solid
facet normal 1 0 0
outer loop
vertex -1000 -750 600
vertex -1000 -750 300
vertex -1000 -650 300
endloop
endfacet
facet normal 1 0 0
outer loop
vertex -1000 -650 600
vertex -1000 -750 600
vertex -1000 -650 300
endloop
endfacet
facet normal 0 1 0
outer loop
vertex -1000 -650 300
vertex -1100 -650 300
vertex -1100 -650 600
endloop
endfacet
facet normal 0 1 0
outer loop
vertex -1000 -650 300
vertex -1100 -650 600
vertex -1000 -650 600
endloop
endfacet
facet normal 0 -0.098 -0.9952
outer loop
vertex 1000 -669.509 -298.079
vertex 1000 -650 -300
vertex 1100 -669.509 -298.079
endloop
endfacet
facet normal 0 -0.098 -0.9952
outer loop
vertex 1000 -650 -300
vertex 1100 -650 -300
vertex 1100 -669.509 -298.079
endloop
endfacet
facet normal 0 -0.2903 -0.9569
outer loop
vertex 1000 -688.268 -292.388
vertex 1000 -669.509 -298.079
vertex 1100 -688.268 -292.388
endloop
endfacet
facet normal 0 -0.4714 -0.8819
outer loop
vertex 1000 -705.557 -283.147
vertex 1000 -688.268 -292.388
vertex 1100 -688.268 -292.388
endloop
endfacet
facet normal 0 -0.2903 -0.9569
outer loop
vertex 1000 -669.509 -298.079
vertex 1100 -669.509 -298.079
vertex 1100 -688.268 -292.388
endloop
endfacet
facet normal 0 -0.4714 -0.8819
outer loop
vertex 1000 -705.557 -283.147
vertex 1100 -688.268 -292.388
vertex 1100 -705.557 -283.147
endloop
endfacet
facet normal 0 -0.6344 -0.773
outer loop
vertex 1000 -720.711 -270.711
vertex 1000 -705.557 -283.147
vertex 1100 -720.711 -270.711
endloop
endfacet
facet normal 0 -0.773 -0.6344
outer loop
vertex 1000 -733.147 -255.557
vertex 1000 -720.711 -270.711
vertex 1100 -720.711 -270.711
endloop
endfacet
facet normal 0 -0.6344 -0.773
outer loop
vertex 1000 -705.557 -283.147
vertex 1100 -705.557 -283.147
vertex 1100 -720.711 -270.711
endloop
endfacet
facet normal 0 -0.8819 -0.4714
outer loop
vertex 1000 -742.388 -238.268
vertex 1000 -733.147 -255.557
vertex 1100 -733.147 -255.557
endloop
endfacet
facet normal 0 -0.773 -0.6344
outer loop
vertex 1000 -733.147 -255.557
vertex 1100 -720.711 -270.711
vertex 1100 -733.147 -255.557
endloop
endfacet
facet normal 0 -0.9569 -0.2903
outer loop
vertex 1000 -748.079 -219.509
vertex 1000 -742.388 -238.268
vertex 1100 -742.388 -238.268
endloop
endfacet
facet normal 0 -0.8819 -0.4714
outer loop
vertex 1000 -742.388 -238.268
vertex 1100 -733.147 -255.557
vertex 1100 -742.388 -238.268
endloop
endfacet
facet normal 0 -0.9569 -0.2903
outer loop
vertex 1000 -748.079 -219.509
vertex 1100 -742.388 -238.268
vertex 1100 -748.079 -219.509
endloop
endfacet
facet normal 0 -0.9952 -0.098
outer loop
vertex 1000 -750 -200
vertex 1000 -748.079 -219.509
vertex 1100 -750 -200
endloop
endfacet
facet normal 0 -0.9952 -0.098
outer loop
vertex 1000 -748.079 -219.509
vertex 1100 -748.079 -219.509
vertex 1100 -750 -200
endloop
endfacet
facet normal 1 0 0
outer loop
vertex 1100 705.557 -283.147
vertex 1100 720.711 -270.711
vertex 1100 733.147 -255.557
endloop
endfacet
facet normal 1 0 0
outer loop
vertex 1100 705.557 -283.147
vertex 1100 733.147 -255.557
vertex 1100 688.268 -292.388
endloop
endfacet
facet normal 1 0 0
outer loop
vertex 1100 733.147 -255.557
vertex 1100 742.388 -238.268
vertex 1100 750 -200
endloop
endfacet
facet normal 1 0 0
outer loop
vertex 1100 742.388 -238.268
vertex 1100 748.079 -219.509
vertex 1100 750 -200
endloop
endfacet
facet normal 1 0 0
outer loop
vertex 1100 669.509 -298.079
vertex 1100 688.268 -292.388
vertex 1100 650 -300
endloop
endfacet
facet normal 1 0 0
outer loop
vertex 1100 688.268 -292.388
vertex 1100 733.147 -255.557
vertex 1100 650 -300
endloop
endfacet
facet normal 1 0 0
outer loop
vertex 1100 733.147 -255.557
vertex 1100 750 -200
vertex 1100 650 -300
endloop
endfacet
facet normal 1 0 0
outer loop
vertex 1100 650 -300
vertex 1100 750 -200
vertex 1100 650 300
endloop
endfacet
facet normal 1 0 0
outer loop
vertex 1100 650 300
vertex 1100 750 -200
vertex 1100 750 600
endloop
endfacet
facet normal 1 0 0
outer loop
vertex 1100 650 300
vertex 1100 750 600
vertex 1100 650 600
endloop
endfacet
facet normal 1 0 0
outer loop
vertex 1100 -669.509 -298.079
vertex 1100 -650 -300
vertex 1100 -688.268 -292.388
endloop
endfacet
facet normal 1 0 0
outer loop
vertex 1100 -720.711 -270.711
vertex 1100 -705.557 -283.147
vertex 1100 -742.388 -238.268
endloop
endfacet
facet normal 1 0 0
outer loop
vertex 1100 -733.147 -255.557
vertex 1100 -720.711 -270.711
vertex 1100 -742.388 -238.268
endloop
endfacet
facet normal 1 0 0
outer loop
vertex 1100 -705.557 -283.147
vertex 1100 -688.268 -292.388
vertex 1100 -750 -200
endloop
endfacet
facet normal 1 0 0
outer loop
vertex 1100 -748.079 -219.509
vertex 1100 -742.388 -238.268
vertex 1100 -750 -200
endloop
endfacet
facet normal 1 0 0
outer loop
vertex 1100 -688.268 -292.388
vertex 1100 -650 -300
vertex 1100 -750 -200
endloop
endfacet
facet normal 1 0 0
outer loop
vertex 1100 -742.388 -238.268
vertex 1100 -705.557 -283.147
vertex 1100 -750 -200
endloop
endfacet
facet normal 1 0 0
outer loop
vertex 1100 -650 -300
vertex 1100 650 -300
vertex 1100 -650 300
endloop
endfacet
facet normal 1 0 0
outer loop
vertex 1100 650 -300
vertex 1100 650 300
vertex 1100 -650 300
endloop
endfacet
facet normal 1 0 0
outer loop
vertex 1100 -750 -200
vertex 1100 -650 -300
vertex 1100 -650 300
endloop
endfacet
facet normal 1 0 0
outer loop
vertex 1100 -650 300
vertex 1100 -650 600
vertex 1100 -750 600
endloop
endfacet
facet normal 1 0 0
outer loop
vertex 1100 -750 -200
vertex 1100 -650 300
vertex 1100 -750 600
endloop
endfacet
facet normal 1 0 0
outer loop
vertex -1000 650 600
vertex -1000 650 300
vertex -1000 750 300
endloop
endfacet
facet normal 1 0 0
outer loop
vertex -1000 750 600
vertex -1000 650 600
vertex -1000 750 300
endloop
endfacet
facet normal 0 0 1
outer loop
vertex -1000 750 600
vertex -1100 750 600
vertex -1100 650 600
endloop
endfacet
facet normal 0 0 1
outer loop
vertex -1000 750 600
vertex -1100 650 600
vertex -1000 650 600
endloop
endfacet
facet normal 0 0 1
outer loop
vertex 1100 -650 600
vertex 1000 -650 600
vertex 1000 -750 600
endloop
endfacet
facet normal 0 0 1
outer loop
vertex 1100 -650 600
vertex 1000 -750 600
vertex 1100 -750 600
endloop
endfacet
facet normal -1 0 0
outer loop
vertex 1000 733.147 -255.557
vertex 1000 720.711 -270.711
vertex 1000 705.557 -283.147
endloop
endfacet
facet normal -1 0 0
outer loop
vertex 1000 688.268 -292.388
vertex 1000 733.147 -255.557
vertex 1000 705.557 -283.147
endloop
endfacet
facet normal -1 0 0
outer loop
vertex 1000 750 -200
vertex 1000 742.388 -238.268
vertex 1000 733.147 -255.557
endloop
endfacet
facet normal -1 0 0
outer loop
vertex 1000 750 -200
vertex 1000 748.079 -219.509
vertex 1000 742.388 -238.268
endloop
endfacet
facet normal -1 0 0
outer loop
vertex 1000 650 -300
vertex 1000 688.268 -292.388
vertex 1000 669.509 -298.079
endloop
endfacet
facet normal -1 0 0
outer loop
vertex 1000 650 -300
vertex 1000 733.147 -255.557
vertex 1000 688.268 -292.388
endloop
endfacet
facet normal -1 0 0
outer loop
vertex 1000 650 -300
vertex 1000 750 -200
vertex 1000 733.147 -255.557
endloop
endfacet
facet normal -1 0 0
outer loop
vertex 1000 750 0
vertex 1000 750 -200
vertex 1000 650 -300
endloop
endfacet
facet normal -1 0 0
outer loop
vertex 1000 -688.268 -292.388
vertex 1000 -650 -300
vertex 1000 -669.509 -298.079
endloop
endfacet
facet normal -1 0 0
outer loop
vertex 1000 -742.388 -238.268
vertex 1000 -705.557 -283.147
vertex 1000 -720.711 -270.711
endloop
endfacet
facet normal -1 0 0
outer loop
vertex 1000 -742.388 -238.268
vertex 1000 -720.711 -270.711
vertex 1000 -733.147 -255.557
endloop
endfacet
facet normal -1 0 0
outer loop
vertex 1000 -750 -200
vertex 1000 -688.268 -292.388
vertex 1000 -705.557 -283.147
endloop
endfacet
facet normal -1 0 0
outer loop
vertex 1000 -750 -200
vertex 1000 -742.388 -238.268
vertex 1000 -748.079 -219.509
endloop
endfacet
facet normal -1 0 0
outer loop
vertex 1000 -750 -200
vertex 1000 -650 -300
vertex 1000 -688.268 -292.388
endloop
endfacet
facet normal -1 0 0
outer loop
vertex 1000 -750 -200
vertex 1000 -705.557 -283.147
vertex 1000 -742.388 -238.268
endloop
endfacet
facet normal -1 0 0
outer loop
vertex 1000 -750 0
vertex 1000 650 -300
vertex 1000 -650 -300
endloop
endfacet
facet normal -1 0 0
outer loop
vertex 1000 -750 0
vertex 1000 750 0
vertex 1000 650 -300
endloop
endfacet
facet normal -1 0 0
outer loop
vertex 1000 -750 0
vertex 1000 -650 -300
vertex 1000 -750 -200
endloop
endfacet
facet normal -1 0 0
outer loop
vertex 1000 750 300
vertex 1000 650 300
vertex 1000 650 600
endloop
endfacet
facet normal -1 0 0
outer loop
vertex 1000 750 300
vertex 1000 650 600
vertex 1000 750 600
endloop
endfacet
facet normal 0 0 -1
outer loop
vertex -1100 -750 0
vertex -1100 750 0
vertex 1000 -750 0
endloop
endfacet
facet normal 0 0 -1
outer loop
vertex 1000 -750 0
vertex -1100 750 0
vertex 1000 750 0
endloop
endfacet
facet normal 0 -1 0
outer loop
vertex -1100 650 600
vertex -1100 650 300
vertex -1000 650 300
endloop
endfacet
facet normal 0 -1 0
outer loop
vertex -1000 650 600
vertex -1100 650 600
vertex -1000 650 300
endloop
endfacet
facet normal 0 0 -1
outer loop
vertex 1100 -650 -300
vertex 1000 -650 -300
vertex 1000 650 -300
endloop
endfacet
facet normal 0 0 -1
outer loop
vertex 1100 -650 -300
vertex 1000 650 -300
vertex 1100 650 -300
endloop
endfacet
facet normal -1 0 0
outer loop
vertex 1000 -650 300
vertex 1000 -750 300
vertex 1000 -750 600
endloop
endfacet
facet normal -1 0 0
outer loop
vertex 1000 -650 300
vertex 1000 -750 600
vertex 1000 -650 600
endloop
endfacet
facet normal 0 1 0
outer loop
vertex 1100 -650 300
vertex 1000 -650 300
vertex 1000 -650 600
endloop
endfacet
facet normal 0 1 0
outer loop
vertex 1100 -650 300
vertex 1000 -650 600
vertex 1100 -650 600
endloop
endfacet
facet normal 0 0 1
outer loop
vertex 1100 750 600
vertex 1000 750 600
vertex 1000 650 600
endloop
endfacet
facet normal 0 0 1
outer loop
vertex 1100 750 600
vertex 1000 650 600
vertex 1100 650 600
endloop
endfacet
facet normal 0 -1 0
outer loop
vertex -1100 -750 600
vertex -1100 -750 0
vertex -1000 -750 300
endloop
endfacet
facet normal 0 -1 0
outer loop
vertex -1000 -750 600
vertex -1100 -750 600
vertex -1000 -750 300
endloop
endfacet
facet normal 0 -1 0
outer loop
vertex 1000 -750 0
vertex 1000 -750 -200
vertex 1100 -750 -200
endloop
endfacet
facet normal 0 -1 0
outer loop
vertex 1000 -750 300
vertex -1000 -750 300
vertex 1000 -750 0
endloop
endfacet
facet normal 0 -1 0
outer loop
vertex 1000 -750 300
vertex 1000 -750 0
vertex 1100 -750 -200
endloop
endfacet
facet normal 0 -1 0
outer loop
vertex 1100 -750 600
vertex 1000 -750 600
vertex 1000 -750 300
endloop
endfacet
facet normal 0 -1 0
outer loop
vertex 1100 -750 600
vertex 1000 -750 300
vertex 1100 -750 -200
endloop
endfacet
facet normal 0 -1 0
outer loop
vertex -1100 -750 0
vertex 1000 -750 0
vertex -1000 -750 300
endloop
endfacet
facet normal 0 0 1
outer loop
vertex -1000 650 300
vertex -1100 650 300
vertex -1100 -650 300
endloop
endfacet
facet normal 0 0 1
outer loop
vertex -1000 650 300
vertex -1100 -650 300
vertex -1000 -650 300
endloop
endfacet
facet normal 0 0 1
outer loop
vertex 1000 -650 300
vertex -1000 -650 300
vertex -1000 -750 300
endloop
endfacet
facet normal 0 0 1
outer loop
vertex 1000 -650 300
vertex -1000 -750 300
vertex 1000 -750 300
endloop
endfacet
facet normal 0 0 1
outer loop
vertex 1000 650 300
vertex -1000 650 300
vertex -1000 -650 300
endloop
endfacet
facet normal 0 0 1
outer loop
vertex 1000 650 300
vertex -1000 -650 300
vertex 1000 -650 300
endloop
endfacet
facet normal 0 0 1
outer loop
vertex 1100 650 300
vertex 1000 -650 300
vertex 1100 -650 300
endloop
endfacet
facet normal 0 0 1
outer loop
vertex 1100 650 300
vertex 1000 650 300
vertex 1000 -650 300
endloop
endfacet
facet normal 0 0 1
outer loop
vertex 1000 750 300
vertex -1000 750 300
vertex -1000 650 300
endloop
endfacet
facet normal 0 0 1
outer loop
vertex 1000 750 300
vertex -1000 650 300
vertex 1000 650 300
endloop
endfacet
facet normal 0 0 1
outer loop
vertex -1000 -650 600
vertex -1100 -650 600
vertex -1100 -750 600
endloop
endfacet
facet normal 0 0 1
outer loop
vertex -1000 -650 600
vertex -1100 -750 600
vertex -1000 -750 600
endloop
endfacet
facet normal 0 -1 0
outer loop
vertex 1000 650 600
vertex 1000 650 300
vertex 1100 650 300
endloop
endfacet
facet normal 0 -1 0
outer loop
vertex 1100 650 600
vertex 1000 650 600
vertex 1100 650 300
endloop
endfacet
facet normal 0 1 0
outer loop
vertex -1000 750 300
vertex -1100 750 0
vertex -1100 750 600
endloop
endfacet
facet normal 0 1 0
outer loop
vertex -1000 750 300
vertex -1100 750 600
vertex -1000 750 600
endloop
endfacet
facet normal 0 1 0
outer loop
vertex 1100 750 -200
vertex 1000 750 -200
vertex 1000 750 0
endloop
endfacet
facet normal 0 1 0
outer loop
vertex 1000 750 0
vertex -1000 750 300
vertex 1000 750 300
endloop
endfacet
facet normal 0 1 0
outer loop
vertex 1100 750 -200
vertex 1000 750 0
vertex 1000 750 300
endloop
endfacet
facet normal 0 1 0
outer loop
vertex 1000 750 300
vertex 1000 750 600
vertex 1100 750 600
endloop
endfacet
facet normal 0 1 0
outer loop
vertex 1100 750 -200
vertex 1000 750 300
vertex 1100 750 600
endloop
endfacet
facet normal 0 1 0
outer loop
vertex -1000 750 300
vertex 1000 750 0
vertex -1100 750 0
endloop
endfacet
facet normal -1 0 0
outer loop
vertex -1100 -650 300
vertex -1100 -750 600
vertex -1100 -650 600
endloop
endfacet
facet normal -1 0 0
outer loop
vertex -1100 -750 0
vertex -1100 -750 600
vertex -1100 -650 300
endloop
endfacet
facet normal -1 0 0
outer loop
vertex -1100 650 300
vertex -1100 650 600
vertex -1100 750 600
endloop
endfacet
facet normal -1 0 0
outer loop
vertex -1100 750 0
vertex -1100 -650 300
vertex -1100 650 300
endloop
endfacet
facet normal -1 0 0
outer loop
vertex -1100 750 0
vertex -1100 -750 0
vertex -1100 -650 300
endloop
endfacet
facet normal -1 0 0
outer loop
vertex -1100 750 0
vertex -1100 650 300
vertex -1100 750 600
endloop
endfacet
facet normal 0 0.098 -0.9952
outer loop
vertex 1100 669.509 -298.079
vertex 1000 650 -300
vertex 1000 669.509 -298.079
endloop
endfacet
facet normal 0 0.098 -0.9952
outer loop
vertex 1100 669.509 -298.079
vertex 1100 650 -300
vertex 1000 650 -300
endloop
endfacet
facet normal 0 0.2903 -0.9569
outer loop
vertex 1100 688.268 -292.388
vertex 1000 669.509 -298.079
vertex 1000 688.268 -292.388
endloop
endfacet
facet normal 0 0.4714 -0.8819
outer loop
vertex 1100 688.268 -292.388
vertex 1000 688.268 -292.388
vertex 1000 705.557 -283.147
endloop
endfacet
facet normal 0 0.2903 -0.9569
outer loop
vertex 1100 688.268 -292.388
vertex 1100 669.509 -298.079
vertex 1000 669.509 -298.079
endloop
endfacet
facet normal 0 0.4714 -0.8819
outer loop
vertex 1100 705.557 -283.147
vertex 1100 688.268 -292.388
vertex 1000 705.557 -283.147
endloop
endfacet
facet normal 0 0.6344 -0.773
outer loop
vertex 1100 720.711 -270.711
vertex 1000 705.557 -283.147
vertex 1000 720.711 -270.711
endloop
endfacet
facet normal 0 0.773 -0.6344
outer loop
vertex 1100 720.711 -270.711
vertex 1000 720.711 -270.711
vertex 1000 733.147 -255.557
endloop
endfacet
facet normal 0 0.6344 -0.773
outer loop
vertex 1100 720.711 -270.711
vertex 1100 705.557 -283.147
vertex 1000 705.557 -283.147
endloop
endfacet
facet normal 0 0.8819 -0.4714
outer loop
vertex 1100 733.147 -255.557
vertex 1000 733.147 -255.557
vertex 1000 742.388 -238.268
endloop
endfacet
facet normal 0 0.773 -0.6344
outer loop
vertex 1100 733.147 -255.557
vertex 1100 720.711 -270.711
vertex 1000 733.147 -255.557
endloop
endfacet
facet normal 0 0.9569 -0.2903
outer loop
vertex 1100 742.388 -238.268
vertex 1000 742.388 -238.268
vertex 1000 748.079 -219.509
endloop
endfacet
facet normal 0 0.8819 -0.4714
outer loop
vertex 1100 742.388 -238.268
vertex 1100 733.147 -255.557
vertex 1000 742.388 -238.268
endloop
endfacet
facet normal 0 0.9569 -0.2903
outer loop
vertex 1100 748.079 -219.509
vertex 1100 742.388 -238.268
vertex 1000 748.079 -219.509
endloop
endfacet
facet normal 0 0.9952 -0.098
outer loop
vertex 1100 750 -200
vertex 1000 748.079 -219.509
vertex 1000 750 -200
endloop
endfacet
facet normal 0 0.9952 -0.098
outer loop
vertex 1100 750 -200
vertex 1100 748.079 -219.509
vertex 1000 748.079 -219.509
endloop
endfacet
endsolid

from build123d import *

# Parameters (mm, degrees)
F0_W     = 2200
F0_H     = 1500
F1_DEPTH = 300
F2_W     = 100
F2_H     = 100
F3_DEPTH = 300
F4_W     = 100
F4_H     = 1500
F5_DEPTH = 300
F6_R     = 100


with BuildPart() as f1:
    # F0 (on Top) → F1 (new body)
    with BuildSketch(Plane.XY):
        Rectangle(F0_W, F0_H)
    extrude(amount=F1_DEPTH)

    # F2 (on face) → F3 (join)
    with BuildSketch(Plane.XY.offset(300)):
        with Locations((-1050, -700)):
            Rectangle(F2_W, F2_H)
        with Locations((-1050, 700)):
            Rectangle(F2_W, F2_H)
        with Locations((1050, -700)):
            Rectangle(F2_W, F2_H)
        with Locations((1050, 700)):
            Rectangle(F2_W, F2_H)
    extrude(amount=F3_DEPTH)

    # F4 (on face) → F5 (join)
    with BuildSketch(Plane(origin=(0, 0, 0), x_dir=(1, 0, 0), z_dir=(0, 0, -1))):
        with Locations((1050, 0)):
            Rectangle(F4_W, F4_H)
    extrude(amount=F5_DEPTH)

    # F6
    f6_edges = [f1.edges().sort_by_distance(p)[0] for p in [
        (1050, -750, -300),
        (1050, 750, -300),
    ]]
    fillet(f6_edges, radius=F6_R)


solid = f1.part
